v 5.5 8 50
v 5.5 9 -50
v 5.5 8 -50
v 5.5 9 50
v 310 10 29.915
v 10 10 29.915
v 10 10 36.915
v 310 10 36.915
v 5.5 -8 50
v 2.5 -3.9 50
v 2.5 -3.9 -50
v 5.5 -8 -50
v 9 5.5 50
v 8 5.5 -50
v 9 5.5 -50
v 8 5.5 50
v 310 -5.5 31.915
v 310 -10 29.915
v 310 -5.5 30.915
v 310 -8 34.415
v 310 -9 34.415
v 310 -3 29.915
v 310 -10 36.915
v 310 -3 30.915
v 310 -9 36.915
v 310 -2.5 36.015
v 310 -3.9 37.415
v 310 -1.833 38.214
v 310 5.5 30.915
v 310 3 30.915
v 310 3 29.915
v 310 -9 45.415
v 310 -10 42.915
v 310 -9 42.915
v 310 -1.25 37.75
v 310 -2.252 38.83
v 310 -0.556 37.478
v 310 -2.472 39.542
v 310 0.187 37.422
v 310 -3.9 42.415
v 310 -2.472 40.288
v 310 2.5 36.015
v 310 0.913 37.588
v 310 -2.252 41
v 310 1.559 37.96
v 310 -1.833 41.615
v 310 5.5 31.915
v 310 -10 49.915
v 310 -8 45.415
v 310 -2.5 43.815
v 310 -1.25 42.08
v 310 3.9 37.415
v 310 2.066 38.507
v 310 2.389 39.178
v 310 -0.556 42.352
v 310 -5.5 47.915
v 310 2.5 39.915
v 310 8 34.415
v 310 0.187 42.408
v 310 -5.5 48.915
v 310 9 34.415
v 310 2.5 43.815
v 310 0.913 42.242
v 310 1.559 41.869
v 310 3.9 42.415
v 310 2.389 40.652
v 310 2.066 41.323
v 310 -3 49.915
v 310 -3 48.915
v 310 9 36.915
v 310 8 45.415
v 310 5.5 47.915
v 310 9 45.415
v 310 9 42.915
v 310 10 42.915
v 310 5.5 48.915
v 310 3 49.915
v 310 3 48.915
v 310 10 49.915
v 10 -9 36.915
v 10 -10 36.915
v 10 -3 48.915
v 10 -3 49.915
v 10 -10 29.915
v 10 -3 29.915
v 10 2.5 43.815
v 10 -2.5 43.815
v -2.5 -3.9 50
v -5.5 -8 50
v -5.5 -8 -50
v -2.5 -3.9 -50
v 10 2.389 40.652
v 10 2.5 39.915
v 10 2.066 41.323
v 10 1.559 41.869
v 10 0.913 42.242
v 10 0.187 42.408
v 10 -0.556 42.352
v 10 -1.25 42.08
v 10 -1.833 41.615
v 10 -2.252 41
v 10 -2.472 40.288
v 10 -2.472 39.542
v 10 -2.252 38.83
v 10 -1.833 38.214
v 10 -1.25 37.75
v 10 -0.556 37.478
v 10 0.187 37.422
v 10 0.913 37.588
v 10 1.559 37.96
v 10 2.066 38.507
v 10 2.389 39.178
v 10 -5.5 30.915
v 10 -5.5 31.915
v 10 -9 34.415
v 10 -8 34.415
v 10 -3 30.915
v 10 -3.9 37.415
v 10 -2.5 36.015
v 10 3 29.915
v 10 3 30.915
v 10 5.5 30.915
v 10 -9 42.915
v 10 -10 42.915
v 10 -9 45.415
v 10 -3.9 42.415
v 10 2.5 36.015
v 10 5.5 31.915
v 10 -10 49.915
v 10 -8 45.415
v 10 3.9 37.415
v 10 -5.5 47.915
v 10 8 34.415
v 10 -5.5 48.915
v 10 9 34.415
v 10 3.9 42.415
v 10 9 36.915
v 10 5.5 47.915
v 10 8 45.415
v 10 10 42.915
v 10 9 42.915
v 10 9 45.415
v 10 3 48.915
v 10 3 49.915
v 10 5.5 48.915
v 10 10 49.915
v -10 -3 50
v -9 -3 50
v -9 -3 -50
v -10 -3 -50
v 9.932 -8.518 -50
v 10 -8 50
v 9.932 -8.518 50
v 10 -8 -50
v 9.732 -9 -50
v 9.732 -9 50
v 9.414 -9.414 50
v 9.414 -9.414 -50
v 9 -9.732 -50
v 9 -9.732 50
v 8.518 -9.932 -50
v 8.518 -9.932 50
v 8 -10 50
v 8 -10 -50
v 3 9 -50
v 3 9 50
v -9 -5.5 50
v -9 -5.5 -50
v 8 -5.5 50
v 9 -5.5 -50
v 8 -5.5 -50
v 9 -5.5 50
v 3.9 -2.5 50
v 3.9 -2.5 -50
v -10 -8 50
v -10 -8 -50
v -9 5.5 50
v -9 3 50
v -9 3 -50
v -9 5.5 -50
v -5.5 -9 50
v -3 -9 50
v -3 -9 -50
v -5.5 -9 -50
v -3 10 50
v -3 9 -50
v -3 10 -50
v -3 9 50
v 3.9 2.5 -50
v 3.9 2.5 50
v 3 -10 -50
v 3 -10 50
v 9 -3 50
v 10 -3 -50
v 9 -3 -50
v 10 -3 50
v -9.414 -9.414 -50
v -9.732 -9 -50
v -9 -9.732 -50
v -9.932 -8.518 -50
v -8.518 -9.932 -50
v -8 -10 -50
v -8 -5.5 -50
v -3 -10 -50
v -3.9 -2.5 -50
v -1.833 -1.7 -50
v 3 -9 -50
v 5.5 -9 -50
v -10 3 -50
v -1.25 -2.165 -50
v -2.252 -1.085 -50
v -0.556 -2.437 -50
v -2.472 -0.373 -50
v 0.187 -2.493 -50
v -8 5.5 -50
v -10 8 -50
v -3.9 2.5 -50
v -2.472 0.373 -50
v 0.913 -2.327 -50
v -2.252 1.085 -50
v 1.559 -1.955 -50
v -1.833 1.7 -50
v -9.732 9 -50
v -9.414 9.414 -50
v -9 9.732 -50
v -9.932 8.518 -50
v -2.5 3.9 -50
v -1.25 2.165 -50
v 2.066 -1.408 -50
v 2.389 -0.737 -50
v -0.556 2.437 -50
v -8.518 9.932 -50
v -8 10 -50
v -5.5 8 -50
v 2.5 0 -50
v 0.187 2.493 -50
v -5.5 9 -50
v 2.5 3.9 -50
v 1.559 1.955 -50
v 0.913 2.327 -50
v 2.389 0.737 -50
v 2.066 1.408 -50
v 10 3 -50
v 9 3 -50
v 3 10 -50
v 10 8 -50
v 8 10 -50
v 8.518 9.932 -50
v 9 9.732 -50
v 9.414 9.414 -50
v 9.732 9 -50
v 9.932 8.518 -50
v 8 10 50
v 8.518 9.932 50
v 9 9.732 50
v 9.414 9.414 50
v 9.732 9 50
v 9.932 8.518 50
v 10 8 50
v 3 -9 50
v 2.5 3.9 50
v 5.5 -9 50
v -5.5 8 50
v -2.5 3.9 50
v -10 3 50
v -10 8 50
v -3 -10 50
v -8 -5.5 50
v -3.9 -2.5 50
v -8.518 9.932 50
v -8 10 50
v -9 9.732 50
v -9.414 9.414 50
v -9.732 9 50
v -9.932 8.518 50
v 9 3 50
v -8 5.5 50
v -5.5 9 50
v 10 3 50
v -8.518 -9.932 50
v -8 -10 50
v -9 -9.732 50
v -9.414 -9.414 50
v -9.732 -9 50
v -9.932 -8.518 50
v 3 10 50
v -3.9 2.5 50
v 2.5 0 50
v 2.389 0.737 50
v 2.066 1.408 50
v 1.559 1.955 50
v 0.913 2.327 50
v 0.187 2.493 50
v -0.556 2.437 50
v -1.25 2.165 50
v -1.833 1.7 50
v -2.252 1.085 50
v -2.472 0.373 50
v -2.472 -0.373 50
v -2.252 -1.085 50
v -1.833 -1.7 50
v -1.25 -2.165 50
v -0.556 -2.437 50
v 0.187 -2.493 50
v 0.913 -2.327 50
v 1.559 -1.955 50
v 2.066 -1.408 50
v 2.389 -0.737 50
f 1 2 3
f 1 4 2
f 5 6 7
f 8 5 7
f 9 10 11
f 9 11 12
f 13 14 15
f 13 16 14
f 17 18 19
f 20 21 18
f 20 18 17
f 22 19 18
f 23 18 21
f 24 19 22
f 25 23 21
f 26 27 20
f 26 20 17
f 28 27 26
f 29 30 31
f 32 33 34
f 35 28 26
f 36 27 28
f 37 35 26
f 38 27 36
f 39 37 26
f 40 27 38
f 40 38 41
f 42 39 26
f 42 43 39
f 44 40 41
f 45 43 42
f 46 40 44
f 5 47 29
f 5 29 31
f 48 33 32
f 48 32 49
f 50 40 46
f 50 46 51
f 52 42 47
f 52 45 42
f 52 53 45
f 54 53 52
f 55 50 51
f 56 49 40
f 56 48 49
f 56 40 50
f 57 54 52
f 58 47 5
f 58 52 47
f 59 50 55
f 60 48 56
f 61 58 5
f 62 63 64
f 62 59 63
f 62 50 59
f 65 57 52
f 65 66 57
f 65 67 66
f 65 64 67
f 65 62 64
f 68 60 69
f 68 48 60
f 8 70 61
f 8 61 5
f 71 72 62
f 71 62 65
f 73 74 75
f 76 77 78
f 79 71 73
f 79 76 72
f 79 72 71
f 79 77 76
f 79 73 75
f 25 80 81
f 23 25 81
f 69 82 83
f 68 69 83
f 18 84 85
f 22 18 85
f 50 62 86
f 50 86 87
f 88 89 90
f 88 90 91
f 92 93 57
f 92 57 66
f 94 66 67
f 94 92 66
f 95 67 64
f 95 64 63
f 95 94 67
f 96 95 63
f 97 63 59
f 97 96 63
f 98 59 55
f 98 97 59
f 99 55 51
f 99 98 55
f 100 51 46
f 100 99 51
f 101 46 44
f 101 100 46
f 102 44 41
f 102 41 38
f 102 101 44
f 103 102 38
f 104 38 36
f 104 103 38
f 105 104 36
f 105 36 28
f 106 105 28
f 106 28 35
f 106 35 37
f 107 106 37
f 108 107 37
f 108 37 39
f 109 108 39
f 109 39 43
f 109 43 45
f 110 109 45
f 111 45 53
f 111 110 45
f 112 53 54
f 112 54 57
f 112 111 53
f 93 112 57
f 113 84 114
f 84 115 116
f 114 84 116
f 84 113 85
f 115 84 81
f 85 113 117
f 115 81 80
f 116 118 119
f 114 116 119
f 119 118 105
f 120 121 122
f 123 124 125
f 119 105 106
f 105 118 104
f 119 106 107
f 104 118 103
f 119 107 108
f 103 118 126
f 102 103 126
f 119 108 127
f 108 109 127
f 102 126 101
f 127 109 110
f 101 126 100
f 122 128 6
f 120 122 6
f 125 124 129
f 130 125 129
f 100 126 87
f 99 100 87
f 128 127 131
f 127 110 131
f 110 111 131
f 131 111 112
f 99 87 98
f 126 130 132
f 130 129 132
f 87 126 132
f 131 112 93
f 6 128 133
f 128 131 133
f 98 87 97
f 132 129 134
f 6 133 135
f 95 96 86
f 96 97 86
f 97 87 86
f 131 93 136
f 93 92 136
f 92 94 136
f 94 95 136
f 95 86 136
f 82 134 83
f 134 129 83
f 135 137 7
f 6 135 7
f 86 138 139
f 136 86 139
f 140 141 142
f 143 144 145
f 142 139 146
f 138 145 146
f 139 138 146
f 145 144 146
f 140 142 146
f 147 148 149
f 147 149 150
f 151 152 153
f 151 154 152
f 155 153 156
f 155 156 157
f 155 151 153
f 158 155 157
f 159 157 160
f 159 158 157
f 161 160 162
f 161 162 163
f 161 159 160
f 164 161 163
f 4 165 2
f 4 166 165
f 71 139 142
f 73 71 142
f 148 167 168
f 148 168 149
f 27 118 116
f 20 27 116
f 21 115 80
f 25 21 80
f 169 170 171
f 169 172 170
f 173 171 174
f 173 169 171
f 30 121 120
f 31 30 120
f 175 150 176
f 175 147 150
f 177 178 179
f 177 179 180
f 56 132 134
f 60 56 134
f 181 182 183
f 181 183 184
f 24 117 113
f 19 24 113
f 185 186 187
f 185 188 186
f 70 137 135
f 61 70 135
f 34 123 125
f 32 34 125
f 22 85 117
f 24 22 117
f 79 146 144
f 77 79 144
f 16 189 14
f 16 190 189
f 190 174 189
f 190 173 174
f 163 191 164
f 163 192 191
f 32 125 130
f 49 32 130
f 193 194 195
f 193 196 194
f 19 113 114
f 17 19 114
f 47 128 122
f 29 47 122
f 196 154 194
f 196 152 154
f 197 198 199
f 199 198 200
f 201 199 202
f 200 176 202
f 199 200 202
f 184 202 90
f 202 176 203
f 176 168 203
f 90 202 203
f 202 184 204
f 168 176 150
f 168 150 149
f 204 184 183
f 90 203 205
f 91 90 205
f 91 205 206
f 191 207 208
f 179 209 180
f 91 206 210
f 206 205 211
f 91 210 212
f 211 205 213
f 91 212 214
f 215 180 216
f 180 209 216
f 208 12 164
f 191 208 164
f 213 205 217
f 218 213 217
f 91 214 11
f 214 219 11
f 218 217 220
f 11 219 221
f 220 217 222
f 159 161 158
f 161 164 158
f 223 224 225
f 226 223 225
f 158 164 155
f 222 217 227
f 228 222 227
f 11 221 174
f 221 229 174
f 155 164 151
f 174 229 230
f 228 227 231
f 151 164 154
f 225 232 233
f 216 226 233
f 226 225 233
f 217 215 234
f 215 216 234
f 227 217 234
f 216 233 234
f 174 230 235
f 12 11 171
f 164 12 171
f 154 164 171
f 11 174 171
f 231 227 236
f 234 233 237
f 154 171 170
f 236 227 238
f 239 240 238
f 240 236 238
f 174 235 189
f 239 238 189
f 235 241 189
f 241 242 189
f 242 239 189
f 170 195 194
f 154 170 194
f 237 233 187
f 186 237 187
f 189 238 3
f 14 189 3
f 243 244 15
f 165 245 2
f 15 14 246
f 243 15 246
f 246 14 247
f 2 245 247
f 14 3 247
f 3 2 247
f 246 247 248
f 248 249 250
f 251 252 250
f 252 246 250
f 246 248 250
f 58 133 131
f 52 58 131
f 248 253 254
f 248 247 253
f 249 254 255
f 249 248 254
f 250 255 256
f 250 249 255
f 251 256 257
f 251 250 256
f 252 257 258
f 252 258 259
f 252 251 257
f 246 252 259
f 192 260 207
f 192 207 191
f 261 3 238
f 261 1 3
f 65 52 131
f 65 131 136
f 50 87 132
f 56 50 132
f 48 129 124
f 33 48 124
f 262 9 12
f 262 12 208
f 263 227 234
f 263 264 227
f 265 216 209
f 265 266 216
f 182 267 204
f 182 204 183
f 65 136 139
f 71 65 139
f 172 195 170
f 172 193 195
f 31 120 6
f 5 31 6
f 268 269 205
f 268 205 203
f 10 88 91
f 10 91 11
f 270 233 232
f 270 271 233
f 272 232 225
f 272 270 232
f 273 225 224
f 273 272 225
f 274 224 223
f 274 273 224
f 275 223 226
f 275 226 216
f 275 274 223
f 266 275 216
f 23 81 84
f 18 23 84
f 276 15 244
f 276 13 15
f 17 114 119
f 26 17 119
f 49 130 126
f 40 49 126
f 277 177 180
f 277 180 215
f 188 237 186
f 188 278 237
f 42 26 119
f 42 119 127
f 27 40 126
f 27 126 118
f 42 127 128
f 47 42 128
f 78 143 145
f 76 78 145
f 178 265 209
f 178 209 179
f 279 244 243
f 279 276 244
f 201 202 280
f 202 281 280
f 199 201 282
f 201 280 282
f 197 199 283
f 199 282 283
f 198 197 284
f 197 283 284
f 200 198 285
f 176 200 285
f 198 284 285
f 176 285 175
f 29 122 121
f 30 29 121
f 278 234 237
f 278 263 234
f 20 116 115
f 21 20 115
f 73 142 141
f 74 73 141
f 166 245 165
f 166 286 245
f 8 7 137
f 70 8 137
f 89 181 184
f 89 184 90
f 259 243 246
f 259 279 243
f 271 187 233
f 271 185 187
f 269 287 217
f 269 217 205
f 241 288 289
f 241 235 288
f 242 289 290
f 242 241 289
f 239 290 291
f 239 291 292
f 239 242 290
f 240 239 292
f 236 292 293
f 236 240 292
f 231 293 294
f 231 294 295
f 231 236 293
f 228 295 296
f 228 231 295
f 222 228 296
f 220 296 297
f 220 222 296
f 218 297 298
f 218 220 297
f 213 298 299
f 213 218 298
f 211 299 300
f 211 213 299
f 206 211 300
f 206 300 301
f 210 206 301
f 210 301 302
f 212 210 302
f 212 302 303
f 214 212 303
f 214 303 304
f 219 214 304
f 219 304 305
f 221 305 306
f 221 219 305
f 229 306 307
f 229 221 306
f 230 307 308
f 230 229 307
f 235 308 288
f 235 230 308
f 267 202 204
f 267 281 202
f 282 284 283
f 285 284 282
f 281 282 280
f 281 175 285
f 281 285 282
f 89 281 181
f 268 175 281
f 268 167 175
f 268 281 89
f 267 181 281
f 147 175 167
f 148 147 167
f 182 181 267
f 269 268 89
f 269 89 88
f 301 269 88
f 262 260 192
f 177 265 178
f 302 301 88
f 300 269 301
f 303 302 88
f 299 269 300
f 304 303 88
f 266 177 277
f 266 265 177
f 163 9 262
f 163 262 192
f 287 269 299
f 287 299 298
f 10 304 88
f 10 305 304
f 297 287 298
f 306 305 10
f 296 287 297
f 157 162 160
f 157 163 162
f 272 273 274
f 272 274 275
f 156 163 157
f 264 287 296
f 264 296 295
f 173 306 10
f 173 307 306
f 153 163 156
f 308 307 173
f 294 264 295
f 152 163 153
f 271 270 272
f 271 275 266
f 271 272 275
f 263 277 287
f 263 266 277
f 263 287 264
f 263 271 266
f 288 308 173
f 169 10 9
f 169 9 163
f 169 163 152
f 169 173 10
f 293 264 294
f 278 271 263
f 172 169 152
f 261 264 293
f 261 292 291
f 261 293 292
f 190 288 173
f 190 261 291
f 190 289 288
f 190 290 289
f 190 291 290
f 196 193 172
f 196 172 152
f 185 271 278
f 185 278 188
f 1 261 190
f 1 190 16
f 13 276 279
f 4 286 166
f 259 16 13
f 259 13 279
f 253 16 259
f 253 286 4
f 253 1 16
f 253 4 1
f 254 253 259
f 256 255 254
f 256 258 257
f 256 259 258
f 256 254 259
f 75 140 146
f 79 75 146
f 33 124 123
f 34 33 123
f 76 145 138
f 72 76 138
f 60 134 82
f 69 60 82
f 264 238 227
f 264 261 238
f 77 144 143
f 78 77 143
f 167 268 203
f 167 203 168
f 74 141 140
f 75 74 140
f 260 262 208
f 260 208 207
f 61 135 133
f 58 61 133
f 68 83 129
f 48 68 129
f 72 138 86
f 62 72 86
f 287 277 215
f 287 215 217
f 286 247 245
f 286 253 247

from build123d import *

# Parameters (mm, degrees)
F0_R     = 2.5
F1_DEPTH = 50
F2_R     = 2
F3_R     = 2.5
F4_DEPTH = 300


with BuildPart() as f1:
    # F0 (on Top) → F1 (new body, symmetric)
    with BuildSketch(Plane.XY):
        Polygon((-3, 10), (-10, 10), (-10, 3), (-9, 3), (-9, 5.5), (-8, 5.5), (-3.9, 2.5), (-3.9, -2.5), (-8, -5.5), (-9, -5.5), (-9, -3), (-10, -3), (-10, -10), (-3, -10), (-3, -9), (-5.5, -9), (-5.5, -8), (-2.5, -3.9), (2.5, -3.9), (5.5, -8), (5.5, -9), (3, -9), (3, -10), (10, -10), (10, -3), (9, -3), (9, -5.5), (8, -5.5), (3.9, -2.5), (3.9, 2.5), (8, 5.5), (9, 5.5), (9, 3), (10, 3), (10, 10), (3, 10), (3, 9), (5.5, 9), (5.5, 8), (2.5, 3.9), (-2.5, 3.9), (-5.5, 8), (-5.5, 9), (-3, 9), align=None)
        Circle(F0_R, mode=Mode.SUBTRACT)
    extrude(amount=F1_DEPTH, both=True)

    # F2
    f2_edges = [f1.edges().sort_by_distance(p)[0] for p in [
        (-10, -10, 0),
        (10, -10, 0),
        (10, 10, 0),
        (-10, 10, 0),
    ]]
    fillet(f2_edges, radius=F2_R)


with BuildPart() as f4:
    # F3 (on face) → F4 (new body)
    with BuildSketch(Plane.YZ.offset(10)):
        Polygon((-3, 49.914906), (-10, 49.914906), (-10, 42.914906), (-9, 42.914906), (-9, 45.414906), (-8, 45.414906), (-3.9, 42.414906), (-3.9, 37.414906), (-8, 34.414906), (-9, 34.414906), (-9, 36.914906), (-10, 36.914906), (-10, 29.914906), (-3, 29.914906), (-3, 30.914906), (-5.5, 30.914906), (-5.5, 31.914906), (-2.5, 36.014906), (2.5, 36.014906), (5.5, 31.914906), (5.5, 30.914906), (3, 30.914906), (3, 29.914906), (10, 29.914906), (10, 36.914906), (9, 36.914906), (9, 34.414906), (8, 34.414906), (3.9, 37.414906), (3.9, 42.414906), (8, 45.414906), (9, 45.414906), (9, 42.914906), (10, 42.914906), (10, 49.914906), (3, 49.914906), (3, 48.914906), (5.5, 48.914906), (5.5, 47.914906), (2.5, 43.814906), (-2.5, 43.814906), (-5.5, 47.914906), (-5.5, 48.914906), (-3, 48.914906), align=None)
        with Locations((0, 39.914906)):
            Circle(F3_R, mode=Mode.SUBTRACT)
    extrude(amount=F4_DEPTH)


solid = Compound([f1.part, f4.part])
